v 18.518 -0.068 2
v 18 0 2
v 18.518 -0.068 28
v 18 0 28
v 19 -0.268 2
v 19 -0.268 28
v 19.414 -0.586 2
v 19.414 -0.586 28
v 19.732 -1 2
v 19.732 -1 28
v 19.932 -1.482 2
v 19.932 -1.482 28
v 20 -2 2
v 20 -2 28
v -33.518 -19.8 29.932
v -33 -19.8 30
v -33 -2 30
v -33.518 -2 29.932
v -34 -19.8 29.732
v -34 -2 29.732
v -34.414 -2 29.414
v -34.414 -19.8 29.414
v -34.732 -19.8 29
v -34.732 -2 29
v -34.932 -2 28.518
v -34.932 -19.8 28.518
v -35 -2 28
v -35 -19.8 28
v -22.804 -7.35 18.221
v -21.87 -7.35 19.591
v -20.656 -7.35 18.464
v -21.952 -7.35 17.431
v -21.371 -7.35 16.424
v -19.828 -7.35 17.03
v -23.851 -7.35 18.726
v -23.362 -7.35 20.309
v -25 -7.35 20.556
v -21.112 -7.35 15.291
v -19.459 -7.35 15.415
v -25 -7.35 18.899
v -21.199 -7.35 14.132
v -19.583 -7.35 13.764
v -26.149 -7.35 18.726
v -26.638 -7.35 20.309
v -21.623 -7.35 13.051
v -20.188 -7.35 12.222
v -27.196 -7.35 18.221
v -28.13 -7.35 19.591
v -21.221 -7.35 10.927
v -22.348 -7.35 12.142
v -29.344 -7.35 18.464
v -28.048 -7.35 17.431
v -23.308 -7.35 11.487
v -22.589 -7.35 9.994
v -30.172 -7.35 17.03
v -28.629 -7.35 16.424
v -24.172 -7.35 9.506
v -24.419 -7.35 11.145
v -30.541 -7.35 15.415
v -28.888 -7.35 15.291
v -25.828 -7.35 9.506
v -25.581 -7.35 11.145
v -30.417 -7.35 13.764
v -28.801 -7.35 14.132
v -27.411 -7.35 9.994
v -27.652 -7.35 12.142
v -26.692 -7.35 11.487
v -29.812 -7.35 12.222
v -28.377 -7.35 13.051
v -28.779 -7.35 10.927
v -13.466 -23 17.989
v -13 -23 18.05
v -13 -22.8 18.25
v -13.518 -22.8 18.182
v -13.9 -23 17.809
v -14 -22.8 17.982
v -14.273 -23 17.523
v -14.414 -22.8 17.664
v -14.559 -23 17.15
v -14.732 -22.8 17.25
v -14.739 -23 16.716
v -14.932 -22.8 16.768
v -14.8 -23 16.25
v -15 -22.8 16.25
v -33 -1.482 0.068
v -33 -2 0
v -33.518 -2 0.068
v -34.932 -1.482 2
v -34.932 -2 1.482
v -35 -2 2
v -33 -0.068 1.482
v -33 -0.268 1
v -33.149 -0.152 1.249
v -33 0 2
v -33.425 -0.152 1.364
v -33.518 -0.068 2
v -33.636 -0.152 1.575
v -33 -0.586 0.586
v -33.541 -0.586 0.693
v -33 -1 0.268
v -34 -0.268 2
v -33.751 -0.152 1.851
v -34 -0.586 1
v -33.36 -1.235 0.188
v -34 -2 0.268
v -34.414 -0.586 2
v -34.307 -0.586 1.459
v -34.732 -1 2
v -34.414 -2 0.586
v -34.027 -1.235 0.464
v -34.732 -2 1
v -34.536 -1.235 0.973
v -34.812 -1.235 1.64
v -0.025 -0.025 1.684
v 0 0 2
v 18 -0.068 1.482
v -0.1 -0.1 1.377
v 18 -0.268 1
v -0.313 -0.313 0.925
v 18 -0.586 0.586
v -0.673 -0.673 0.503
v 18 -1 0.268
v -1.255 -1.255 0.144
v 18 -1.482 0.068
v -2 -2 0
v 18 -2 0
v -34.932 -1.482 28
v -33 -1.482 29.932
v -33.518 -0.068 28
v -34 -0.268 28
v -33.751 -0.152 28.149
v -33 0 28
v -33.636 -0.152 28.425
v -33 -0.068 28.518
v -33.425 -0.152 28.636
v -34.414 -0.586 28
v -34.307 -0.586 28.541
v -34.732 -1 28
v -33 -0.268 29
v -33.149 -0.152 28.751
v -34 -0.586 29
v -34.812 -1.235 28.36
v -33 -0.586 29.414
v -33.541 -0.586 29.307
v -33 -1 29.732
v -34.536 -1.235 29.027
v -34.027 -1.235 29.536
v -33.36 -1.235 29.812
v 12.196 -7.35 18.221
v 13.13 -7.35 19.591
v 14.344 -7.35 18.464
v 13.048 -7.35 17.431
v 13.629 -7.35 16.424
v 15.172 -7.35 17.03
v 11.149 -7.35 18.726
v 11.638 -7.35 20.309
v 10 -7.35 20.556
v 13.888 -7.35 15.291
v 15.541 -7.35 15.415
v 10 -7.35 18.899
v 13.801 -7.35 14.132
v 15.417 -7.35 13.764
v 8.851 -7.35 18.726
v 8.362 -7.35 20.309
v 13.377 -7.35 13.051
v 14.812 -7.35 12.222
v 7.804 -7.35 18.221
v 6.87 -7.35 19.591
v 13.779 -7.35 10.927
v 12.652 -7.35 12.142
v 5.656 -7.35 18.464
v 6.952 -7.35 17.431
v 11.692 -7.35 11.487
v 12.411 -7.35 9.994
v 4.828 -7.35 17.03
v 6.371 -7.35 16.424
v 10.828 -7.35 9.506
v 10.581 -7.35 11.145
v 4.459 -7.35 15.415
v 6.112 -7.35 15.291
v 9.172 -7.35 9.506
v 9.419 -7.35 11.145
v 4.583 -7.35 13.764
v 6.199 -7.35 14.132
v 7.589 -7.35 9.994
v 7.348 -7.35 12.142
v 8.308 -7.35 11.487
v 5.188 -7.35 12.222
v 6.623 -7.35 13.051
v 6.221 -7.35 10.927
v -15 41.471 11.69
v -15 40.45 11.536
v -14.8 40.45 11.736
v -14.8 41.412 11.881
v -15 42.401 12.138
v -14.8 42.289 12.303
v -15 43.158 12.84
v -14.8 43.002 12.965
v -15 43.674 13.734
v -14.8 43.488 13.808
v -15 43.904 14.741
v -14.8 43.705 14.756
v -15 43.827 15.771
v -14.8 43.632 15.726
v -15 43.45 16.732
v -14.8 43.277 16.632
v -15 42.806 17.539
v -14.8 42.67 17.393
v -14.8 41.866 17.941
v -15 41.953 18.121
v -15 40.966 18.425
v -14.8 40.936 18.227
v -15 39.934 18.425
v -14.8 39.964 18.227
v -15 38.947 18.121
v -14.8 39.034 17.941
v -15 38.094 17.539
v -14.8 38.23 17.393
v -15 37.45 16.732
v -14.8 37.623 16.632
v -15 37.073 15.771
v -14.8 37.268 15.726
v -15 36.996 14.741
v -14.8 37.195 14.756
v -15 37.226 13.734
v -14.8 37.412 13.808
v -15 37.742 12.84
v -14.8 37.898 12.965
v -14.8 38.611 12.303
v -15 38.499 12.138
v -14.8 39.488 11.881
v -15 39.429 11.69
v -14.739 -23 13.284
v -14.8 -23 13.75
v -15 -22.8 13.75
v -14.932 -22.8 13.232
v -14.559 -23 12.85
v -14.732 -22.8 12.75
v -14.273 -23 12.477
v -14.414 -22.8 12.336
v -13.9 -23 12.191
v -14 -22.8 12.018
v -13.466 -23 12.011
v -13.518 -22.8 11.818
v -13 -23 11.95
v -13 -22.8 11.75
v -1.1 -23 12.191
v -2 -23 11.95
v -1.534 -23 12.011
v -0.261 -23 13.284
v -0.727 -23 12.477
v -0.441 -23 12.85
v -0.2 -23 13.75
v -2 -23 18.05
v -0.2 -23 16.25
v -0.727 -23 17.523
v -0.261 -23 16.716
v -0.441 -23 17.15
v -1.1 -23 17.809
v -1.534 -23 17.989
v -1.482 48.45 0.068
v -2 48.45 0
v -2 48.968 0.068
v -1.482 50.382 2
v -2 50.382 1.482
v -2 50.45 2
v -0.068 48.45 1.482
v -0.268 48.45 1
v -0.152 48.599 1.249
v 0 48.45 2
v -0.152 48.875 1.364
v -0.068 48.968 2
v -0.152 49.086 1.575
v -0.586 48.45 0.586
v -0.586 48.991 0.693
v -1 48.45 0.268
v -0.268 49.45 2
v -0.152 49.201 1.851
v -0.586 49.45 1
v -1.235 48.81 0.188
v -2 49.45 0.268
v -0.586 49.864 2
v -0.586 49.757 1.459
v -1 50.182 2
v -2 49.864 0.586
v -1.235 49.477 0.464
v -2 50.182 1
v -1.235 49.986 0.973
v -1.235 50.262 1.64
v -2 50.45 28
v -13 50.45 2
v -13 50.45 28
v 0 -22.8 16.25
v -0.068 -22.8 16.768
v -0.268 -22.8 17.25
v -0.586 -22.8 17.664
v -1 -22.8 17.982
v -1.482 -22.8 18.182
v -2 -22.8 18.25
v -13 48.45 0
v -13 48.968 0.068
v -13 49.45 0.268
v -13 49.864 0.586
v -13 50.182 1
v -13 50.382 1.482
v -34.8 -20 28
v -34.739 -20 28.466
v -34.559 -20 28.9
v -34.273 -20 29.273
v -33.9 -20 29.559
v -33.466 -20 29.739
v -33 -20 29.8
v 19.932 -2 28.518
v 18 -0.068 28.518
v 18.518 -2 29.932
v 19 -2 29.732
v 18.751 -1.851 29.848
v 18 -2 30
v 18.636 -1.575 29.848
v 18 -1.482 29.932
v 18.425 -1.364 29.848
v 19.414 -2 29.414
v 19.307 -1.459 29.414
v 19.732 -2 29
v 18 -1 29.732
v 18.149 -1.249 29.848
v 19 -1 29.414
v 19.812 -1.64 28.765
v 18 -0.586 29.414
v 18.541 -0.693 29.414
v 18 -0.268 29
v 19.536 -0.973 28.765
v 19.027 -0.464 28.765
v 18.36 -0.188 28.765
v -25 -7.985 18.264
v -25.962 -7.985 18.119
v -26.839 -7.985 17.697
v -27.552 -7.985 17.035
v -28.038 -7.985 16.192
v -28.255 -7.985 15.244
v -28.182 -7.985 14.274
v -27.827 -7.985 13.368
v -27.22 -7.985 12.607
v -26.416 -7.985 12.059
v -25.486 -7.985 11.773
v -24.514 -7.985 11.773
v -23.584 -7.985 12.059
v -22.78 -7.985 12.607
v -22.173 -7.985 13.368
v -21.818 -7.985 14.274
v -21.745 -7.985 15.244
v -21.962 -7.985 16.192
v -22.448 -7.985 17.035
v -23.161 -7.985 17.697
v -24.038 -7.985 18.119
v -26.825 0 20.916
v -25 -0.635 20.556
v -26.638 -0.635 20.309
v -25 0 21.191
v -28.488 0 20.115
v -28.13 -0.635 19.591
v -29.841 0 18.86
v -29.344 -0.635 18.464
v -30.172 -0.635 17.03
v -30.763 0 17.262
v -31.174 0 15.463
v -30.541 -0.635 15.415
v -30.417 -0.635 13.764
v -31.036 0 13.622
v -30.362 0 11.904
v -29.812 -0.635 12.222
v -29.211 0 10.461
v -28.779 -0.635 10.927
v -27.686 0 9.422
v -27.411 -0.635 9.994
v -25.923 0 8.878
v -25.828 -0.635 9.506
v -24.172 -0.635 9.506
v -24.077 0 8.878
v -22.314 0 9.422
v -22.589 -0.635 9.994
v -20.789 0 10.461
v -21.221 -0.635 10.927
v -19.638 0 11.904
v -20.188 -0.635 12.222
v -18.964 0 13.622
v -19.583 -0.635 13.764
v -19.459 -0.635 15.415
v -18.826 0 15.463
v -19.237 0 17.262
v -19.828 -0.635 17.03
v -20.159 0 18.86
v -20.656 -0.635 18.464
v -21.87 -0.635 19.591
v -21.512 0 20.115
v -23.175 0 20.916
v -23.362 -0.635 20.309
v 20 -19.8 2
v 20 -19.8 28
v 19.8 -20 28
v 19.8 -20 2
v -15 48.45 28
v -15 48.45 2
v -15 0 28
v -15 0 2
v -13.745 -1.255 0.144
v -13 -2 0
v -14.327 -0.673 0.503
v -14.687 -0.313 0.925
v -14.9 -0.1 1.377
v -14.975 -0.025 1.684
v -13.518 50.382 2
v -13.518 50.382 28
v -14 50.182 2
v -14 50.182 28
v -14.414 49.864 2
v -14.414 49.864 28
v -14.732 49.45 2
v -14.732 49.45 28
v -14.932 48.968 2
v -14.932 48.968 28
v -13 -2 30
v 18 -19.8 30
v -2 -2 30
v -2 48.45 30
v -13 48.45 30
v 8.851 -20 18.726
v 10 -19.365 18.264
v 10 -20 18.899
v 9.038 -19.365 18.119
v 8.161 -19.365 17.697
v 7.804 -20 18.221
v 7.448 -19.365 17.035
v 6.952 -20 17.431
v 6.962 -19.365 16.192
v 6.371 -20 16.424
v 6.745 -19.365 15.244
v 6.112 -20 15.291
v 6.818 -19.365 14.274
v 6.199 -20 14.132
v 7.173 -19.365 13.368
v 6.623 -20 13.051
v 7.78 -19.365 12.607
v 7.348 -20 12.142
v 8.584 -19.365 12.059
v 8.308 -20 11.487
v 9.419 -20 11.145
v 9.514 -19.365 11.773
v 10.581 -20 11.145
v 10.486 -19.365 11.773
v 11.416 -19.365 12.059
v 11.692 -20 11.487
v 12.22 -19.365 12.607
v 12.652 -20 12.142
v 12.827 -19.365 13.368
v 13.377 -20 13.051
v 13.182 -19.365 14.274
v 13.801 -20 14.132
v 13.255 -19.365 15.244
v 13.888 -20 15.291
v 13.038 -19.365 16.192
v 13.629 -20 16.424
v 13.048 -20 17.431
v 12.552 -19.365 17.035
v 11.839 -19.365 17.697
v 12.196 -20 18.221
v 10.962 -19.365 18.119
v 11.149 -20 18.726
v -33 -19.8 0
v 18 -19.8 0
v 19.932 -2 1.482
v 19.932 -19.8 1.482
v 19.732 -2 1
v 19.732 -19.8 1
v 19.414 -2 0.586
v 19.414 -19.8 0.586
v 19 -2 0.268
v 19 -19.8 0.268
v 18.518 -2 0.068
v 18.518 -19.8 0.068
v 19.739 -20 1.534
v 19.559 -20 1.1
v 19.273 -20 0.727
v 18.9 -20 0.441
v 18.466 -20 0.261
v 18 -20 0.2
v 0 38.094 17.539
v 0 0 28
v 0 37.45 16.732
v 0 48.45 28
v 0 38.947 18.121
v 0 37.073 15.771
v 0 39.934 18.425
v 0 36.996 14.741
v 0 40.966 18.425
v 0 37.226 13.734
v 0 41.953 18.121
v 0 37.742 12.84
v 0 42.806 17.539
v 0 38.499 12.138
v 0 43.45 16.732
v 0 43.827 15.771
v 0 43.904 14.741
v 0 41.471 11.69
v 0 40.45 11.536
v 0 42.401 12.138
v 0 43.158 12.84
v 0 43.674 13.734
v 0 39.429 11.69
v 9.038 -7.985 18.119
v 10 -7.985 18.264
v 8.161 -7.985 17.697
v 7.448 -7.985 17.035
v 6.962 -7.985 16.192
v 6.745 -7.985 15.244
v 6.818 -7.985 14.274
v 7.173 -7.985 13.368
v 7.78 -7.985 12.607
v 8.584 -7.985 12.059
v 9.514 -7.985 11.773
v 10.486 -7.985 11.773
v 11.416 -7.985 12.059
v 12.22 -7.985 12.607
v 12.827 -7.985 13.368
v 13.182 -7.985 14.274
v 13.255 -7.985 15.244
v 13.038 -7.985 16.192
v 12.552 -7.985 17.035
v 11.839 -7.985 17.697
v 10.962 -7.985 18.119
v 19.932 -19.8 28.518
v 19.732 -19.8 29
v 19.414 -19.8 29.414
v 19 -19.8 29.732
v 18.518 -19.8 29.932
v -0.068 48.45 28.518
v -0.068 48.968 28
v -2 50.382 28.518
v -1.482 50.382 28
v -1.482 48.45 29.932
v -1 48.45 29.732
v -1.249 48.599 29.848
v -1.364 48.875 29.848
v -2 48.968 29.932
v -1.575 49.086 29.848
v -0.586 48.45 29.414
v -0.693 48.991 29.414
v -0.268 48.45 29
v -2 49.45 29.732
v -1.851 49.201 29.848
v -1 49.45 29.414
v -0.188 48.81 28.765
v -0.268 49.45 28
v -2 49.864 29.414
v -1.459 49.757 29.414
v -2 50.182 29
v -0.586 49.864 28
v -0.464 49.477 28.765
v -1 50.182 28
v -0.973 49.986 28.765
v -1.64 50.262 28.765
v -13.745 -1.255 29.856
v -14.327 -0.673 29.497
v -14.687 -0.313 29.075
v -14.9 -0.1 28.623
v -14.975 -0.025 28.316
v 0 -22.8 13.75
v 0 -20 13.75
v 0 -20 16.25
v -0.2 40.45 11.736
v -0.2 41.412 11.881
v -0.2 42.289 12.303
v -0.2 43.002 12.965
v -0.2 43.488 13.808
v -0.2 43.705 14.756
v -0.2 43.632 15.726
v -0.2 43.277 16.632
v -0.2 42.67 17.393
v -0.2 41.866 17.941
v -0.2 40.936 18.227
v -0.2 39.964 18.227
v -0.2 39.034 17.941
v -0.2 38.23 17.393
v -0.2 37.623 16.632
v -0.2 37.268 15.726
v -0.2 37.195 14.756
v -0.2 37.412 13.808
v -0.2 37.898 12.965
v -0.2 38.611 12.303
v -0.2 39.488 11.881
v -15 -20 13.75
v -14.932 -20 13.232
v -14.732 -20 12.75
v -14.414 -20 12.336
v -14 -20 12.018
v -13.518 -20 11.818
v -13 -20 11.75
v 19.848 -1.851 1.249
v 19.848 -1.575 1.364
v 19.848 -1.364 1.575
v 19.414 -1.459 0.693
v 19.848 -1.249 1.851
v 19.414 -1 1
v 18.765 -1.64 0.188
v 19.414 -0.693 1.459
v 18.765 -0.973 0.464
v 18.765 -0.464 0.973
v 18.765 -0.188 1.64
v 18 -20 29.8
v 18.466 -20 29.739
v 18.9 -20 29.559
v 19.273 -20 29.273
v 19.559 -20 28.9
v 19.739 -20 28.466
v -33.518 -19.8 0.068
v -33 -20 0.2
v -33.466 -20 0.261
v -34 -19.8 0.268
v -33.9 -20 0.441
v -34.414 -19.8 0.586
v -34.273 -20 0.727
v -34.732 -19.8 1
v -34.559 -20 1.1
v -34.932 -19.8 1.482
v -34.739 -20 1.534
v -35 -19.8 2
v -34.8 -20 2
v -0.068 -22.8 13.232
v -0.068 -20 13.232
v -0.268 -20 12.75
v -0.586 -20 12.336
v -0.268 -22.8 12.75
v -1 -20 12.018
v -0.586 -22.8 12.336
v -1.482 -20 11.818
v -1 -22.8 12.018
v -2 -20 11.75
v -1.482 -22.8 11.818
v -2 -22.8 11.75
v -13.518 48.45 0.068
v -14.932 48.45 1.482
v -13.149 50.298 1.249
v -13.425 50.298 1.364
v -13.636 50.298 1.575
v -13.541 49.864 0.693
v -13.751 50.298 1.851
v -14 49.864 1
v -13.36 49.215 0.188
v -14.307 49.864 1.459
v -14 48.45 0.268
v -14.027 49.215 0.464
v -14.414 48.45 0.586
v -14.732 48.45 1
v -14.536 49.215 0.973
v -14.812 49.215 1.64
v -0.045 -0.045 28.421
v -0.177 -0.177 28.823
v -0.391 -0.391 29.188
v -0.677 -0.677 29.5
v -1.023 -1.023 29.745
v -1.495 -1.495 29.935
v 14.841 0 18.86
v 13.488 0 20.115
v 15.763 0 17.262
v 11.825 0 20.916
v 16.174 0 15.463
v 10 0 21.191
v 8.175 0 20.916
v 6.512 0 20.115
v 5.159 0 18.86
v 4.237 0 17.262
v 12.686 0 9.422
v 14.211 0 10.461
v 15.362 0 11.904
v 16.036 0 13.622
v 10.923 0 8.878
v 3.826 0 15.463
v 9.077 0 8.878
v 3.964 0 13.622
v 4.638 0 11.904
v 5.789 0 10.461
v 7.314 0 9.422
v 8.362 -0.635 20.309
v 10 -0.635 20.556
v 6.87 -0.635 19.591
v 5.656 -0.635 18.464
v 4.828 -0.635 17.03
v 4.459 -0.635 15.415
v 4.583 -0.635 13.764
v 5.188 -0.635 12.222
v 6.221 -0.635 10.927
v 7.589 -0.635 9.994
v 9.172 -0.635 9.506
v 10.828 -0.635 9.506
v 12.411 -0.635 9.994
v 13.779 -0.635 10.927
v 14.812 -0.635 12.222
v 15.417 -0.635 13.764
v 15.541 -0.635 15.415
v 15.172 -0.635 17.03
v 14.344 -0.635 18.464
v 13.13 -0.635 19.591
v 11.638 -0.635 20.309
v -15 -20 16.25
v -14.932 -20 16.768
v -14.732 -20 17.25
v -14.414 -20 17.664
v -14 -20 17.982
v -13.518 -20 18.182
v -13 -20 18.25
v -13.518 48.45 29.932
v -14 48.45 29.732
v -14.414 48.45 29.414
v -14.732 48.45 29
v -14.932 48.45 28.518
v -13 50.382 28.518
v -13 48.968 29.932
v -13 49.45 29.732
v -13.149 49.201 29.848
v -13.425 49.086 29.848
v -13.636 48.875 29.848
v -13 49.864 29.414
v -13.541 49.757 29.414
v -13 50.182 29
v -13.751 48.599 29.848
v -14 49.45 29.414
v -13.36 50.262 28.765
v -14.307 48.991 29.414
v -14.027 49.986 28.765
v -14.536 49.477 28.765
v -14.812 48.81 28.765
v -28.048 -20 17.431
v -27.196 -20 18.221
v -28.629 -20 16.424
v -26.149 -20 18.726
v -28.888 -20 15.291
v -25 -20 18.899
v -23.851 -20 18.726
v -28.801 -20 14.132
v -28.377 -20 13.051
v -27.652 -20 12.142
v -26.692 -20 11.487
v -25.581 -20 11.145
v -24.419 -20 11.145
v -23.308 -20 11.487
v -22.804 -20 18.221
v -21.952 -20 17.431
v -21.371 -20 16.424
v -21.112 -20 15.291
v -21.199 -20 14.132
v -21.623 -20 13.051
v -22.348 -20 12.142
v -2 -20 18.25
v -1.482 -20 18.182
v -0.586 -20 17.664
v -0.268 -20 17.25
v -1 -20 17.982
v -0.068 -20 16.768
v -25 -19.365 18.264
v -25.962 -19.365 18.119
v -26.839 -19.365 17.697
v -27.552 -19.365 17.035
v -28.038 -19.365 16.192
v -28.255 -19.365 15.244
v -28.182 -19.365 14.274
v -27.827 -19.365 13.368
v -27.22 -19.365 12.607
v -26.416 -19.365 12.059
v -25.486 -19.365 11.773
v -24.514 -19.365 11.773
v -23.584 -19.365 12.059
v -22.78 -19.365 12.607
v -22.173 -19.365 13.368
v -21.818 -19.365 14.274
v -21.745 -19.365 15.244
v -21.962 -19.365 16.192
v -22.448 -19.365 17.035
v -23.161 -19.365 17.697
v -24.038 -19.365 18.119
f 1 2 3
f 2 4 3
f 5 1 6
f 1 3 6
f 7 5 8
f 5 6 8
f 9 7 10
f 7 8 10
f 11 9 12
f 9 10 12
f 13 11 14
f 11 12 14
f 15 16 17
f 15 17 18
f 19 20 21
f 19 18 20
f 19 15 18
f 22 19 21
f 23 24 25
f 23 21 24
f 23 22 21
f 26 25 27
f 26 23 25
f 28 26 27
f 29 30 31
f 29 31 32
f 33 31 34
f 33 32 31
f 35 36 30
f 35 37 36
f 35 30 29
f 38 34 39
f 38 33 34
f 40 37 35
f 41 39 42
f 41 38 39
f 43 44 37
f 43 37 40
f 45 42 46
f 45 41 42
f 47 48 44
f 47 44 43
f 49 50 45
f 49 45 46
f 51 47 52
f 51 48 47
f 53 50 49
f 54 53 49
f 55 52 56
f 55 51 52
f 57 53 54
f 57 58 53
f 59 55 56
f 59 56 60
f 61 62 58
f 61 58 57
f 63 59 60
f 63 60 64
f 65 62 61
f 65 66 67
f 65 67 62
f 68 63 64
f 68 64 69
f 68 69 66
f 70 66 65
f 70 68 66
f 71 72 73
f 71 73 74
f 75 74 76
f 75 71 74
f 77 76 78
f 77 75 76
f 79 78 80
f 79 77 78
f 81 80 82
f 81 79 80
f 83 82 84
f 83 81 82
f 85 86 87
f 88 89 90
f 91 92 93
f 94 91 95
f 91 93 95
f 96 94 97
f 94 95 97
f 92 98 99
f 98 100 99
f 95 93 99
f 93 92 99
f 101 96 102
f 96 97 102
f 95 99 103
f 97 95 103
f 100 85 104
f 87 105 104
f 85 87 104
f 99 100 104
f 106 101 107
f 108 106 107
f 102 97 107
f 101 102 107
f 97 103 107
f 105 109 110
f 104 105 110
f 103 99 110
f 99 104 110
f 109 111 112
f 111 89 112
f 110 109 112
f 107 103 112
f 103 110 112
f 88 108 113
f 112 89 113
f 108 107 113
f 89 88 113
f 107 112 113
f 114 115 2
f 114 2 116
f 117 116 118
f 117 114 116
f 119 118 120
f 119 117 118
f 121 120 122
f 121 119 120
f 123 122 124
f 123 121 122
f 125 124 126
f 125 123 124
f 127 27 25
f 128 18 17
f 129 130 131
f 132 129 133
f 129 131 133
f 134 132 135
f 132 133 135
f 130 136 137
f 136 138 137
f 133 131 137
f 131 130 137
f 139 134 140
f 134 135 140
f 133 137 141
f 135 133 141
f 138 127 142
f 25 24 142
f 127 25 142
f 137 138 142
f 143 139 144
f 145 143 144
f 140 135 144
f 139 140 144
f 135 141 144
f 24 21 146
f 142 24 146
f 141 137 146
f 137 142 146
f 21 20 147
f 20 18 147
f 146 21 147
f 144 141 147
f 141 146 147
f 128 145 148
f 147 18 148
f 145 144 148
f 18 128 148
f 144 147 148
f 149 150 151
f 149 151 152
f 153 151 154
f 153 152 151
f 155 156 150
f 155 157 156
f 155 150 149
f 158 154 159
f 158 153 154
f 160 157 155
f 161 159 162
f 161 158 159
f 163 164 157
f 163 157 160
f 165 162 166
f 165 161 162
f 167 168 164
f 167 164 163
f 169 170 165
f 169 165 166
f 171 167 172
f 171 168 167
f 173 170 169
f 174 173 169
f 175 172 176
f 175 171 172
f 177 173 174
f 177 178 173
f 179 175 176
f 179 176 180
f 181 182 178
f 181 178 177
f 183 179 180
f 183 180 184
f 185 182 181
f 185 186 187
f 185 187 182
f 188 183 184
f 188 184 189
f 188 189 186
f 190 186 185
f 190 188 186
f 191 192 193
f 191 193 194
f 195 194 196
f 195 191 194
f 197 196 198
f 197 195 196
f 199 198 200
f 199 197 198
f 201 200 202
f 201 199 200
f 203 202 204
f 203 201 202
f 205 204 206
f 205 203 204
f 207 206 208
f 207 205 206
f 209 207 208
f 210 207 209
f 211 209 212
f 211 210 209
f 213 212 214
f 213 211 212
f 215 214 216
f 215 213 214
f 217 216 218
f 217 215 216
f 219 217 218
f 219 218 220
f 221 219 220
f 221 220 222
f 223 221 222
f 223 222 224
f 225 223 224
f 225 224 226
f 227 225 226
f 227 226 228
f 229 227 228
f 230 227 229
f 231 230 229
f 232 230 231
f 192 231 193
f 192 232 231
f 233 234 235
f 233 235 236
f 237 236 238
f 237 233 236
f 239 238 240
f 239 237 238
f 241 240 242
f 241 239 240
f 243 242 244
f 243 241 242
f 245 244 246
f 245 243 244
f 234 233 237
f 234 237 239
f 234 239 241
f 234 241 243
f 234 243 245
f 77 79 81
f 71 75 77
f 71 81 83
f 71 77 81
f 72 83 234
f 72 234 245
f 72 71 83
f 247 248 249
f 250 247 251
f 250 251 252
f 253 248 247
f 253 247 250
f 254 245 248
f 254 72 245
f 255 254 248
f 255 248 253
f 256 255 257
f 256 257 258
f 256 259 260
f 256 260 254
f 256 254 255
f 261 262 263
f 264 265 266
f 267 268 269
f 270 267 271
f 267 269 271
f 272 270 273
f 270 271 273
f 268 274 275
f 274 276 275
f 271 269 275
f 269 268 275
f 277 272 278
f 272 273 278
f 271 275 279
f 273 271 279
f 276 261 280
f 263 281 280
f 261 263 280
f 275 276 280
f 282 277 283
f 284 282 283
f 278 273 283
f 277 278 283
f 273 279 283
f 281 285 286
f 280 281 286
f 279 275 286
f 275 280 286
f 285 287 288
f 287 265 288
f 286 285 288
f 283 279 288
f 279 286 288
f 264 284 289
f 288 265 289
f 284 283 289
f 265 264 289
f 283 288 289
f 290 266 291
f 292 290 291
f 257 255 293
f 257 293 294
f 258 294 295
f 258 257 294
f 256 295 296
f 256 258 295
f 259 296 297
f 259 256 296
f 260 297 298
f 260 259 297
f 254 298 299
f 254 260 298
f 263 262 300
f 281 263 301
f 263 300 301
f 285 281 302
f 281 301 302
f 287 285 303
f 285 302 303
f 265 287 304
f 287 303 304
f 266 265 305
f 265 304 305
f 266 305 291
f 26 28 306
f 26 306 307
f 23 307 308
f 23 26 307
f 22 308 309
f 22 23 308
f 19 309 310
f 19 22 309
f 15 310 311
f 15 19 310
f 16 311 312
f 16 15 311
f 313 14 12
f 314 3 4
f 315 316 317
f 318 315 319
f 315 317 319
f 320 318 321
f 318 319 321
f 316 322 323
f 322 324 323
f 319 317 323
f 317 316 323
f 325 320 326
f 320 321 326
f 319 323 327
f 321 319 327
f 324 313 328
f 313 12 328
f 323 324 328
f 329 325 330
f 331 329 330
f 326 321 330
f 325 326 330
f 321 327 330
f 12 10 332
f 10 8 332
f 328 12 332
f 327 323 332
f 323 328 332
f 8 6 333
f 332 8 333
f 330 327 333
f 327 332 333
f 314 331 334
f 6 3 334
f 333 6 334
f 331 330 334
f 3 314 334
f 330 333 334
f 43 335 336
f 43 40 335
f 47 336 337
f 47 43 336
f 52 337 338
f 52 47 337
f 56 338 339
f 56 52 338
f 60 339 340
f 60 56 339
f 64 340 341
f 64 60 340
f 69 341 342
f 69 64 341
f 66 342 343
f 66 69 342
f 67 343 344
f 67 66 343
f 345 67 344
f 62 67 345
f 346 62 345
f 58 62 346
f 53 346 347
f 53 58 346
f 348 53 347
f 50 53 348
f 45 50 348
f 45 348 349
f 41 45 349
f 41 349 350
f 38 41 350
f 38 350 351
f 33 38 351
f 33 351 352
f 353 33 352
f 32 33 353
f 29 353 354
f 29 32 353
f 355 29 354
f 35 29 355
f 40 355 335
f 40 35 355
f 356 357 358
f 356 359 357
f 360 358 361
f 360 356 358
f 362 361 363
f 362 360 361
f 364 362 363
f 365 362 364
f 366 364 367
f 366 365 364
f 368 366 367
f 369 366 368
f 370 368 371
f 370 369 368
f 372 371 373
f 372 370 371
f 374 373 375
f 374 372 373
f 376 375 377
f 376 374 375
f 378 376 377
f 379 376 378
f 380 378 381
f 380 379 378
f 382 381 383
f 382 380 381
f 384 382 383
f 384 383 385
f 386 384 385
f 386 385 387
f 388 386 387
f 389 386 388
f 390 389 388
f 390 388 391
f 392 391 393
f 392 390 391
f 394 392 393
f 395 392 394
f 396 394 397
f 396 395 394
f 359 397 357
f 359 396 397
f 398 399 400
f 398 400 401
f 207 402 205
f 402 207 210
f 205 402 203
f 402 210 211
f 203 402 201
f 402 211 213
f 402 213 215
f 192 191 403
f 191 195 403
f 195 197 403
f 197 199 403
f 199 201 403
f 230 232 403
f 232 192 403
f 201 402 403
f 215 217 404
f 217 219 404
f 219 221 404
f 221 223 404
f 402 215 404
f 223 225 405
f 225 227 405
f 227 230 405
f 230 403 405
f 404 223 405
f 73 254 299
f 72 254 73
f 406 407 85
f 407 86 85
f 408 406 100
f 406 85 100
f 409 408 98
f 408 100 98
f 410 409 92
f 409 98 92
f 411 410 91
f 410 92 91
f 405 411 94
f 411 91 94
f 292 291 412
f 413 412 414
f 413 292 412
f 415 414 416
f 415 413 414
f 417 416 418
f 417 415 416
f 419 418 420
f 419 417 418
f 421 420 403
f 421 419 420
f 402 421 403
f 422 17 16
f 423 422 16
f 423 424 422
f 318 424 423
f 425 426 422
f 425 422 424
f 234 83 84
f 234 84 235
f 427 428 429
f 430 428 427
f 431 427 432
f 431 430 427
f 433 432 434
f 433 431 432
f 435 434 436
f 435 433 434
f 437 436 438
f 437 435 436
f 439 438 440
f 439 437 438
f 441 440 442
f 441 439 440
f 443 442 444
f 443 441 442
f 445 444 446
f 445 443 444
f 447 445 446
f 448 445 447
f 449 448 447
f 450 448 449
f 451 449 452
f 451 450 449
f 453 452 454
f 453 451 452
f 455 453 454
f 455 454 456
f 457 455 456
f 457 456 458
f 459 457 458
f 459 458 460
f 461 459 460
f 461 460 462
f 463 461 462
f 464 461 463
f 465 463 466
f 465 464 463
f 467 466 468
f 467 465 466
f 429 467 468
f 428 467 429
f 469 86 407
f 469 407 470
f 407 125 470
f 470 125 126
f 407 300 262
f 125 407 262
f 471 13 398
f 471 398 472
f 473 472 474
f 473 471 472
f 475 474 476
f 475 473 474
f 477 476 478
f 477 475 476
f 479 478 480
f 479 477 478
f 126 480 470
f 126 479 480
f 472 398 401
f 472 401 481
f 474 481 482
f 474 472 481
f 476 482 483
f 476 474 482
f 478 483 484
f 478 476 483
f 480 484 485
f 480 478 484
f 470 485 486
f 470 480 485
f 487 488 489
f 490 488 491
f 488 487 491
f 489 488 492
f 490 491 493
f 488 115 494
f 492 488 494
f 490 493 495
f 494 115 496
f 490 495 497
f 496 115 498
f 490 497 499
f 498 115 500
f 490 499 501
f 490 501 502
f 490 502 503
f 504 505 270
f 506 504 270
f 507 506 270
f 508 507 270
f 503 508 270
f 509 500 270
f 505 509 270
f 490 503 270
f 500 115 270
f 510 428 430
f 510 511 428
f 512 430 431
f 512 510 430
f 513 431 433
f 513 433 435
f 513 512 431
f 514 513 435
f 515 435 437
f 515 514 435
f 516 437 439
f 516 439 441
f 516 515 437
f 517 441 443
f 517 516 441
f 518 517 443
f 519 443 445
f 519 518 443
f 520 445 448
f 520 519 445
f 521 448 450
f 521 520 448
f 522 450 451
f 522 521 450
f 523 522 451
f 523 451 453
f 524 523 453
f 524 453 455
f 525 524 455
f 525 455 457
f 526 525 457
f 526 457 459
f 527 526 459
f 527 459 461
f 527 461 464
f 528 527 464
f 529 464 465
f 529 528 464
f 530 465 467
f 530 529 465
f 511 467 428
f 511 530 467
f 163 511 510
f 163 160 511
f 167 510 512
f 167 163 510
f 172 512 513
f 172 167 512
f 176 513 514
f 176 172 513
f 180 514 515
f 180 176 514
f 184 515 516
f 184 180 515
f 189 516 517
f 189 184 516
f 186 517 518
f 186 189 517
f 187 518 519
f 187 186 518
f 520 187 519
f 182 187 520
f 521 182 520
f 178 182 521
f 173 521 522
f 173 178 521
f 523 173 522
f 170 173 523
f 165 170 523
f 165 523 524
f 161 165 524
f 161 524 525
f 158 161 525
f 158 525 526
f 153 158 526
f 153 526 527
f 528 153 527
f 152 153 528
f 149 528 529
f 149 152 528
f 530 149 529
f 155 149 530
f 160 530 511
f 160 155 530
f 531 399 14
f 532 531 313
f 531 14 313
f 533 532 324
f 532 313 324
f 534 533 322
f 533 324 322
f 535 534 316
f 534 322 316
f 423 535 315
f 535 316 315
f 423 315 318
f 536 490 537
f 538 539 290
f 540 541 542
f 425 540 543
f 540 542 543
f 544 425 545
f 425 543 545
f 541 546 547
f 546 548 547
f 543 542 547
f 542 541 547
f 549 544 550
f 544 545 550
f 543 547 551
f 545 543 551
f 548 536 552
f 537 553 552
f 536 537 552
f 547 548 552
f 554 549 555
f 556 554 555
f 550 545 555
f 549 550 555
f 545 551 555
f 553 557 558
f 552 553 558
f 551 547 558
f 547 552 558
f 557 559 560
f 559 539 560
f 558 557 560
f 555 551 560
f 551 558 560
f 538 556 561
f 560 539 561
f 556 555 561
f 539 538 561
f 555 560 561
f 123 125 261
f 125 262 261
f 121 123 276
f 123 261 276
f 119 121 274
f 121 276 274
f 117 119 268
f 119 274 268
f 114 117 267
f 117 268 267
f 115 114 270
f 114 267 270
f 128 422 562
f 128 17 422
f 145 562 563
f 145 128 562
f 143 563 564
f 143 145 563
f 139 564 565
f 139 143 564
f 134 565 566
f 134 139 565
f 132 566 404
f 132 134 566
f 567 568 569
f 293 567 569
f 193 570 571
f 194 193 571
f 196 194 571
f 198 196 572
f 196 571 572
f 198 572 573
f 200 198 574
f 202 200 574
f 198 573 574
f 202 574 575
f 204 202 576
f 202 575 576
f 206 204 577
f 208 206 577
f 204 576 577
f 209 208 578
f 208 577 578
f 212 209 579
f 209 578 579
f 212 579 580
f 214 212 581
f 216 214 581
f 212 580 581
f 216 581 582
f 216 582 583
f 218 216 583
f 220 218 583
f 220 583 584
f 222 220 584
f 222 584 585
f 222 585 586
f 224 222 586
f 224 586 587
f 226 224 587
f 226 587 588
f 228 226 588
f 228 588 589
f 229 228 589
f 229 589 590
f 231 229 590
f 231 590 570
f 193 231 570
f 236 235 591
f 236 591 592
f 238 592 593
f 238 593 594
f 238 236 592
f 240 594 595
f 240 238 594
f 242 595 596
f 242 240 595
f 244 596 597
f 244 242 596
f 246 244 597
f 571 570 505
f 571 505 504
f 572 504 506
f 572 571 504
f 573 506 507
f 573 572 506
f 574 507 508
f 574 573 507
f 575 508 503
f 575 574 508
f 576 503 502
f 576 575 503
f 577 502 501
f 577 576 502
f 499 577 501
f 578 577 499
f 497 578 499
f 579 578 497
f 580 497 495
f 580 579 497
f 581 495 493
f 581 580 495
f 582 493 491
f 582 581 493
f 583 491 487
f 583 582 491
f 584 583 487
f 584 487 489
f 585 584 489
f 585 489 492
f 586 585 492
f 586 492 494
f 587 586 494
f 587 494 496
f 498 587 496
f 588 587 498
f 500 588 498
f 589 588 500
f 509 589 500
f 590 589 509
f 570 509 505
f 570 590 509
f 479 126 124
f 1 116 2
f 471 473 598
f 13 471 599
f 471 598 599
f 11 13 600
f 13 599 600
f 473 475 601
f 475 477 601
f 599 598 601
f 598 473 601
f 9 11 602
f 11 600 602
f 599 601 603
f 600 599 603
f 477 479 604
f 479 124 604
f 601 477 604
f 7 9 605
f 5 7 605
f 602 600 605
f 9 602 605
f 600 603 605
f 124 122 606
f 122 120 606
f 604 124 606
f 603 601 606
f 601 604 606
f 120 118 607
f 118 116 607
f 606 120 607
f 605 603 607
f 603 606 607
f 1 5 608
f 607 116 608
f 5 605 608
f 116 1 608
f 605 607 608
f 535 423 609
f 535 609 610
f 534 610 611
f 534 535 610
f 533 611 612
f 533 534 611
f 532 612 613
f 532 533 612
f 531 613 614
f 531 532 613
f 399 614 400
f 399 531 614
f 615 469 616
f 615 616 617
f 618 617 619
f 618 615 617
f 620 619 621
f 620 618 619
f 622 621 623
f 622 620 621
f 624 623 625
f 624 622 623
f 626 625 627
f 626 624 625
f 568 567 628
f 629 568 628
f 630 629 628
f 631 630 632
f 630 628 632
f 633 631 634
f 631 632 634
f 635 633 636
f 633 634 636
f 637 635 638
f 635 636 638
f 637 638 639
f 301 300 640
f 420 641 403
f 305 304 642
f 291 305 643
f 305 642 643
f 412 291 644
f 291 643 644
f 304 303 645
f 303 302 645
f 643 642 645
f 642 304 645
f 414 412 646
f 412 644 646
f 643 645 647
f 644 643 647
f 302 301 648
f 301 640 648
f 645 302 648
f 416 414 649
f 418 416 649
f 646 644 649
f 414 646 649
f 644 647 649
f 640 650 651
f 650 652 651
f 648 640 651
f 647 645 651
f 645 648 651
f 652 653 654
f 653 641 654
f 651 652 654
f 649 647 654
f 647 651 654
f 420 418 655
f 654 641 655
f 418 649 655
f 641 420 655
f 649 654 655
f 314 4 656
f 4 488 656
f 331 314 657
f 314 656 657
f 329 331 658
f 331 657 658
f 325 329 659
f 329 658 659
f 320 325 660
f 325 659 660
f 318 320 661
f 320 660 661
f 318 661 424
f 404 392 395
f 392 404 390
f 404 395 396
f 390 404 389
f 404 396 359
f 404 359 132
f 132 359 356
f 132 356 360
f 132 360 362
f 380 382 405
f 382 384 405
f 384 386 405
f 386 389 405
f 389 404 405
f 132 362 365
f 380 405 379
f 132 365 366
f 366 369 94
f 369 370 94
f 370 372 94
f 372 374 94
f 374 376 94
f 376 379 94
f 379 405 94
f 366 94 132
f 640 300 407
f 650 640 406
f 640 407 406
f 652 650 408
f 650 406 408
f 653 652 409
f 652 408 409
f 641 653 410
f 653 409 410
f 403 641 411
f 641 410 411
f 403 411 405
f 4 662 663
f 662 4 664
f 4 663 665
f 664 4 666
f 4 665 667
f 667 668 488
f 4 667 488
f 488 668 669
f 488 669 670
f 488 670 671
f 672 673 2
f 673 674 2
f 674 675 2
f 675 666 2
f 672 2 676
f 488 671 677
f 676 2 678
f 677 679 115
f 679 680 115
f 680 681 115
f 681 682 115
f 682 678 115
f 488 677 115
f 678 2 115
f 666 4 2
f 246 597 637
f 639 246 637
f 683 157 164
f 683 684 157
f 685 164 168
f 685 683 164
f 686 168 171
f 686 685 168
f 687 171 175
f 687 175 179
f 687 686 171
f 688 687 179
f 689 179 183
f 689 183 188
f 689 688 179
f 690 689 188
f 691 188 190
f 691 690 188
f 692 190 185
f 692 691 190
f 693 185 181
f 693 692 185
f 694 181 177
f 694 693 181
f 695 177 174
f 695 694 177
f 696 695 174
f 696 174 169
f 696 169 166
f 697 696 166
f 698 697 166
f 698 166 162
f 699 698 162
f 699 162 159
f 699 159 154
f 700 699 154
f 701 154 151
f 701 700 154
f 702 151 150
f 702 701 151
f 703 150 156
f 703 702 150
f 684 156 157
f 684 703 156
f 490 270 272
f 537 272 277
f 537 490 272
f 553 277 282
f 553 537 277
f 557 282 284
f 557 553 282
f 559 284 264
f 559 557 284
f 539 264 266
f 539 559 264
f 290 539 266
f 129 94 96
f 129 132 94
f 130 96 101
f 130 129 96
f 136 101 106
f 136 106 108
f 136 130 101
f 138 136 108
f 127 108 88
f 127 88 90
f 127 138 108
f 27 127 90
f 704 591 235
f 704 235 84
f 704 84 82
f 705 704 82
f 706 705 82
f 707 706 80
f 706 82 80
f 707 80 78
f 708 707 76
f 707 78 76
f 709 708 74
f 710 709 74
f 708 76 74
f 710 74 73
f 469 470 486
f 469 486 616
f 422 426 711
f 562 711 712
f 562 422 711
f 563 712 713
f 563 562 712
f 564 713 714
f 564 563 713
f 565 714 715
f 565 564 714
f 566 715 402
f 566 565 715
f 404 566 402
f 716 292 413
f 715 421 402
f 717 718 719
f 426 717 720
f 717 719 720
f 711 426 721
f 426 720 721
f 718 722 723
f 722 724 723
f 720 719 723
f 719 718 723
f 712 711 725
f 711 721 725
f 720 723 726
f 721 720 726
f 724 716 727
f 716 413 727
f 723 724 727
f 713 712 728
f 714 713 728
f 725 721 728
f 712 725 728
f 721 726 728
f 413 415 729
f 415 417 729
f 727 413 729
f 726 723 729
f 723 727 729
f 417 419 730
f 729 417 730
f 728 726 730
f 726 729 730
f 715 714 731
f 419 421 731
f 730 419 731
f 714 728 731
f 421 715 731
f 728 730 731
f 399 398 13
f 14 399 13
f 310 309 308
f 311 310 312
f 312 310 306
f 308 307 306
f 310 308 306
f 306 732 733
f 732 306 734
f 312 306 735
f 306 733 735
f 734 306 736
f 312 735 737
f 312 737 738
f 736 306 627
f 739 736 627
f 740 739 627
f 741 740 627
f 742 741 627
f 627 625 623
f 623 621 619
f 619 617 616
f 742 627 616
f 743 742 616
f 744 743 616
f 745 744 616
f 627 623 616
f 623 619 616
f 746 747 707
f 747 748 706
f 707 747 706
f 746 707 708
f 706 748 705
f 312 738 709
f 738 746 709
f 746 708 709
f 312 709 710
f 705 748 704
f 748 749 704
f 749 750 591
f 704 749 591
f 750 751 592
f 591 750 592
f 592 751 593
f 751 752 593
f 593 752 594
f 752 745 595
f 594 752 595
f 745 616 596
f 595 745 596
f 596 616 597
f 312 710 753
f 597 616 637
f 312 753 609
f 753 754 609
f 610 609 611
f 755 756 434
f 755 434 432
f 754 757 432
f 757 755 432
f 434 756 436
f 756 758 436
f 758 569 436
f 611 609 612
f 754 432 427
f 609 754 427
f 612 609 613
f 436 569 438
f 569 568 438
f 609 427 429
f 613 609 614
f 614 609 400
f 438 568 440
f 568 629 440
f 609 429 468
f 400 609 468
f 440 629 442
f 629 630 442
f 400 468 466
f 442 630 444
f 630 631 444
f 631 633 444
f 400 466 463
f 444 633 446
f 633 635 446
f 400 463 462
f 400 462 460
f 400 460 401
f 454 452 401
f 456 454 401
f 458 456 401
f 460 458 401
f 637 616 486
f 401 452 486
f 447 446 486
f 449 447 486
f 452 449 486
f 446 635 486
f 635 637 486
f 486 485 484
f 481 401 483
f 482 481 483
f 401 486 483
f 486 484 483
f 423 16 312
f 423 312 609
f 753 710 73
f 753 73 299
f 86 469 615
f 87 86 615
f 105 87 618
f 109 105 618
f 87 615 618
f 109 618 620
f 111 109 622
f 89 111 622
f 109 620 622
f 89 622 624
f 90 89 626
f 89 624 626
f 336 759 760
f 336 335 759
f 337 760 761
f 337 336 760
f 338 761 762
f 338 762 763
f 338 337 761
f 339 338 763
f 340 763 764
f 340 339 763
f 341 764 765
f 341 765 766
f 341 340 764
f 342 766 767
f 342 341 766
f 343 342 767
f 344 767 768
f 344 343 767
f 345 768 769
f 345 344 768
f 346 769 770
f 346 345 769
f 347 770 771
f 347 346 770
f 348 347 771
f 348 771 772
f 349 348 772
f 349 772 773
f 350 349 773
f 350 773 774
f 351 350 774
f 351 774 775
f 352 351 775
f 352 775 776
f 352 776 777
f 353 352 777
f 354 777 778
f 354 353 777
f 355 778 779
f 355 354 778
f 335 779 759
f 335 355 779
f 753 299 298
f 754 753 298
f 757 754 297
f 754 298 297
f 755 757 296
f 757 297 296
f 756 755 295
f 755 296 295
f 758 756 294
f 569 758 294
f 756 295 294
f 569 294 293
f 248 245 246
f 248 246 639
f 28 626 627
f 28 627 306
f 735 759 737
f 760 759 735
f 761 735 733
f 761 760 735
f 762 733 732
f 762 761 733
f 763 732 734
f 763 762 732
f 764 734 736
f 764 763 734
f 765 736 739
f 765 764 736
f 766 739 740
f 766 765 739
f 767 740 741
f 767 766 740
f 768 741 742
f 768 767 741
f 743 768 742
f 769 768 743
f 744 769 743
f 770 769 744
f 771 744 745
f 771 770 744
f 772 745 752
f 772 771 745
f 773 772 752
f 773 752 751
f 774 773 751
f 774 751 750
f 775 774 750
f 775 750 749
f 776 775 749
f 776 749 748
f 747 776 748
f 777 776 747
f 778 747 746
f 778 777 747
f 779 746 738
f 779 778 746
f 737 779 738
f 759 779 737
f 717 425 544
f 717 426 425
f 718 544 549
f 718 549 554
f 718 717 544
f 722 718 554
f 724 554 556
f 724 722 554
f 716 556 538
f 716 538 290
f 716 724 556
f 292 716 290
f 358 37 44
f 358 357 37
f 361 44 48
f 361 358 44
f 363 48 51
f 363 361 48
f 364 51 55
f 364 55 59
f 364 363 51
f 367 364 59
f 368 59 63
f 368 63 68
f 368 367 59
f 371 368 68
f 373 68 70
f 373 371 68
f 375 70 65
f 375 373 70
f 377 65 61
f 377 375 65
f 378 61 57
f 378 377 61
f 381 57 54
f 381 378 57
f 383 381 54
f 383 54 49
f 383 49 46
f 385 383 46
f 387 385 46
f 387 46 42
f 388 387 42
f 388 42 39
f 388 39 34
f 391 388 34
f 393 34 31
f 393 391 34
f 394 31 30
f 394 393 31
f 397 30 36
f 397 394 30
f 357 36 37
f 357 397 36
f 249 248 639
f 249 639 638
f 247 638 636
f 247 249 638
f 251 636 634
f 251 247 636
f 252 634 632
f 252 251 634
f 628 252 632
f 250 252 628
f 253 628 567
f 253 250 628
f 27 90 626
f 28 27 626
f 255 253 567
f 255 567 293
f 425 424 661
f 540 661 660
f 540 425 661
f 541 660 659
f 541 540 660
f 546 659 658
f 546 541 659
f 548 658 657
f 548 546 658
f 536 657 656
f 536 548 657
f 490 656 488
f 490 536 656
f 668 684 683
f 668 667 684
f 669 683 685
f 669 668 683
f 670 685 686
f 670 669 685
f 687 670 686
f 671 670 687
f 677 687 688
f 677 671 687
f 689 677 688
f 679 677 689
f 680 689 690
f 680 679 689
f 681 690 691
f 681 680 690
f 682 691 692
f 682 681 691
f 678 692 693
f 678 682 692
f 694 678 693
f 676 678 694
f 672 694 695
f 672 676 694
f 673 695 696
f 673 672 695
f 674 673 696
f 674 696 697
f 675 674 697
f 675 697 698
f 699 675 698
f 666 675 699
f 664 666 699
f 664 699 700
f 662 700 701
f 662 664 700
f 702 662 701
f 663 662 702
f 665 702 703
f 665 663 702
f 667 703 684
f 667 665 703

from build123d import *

# Parameters (mm, degrees)
BOSS_EXTRUDE1_DEPTH                           = 30
SKETCH2_R                                     = 3.2639
CUT_EXTRUDE1_DEPTH                            = 36
CBORE_FOR_1_4_SOCKET_HEAD_CAP_SCREW1_AT_COUNT = 2
CBORE_FOR_1_4_SOCKET_HEAD_CAP_SCREW1_AT_PITCH = 35
SKETCH7_W                                     = 15
SKETCH7_H                                     = 6.5
BOSS_EXTRUDE2_DEPTH                           = 3
FILLET1_R                                     = 2
CHAMFER1_SIZE                                 = 0.2


with BuildPart() as part:
    # Sketch1 → Boss-Extrude1 (new body)
    with BuildSketch(Plane.XY):
        Polygon((20, 0), (0, 0), (0, 50.45), (-15, 50.45), (-15, 0), (-35, 0), (-35, -20), (20, -20), align=None)
    extrude(amount=BOSS_EXTRUDE1_DEPTH)

    # Sketch2 → Cut-Extrude1 (cut, through all)
    with BuildSketch(Plane(origin=(0, 0, 0), x_dir=(0, 0, -1), z_dir=(1, 0, 0))):
        with Locations((-15, 40.45)):
            Circle(SKETCH2_R)
    extrude(amount=-CUT_EXTRUDE1_DEPTH, mode=Mode.SUBTRACT)

    # Sketch5 → CBORE for 1/4 Socket Head Cap Screw1 (revolve, cut)
    with BuildSketch(Plane(origin=(-25, 0, 15), x_dir=(0, 0, 1), z_dir=(1, 0, 0))):
        Polygon((0, 0), (0, 20), (3.8989, 20), (3.2639, 19.365), (3.2639, 7.984998), (3.8989, 7.349998), (5.55625, 7.349998), (5.55625, 0.635), (6.19125, 0), align=None)
    cbore_for_1_4_socket_head_cap_screw1 = revolve(axis=Axis((-25, 6.35, 15), (0, -1, 0)), mode=Mode.SUBTRACT)

    # CBORE for 1/4 Socket Head Cap Screw1 at: CBORE for 1/4 Socket Head Cap Screw1 ×2
    with Locations(*[(i * CBORE_FOR_1_4_SOCKET_HEAD_CAP_SCREW1_AT_PITCH, 0, 0) for i in range(1, CBORE_FOR_1_4_SOCKET_HEAD_CAP_SCREW1_AT_COUNT)]):
        add(cbore_for_1_4_socket_head_cap_screw1, mode=Mode.SUBTRACT)

    # Sketch7 → Boss-Extrude2 (add)
    with BuildSketch(Plane.XZ.offset(20)):
        with Locations((-7.5, 15)):
            Rectangle(SKETCH7_W, SKETCH7_H)
    extrude(amount=BOSS_EXTRUDE2_DEPTH)

    # Fillet1
    fillet1_edges = [part.edges().sort_by_distance(p)[0] for p in [
        (-35, -10, 30),
        (-15, 25.225, 0),
        (-7.5, 50.45, 0),
        (0, 25.225, 0),
        (10, 0, 0),
        (20, -10, 0),
        (-35, -10, 0),
        (-25, 0, 0),
        (-15, 50.45, 15),
        (0, 50.45, 15),
        (20, 0, 15),
        (-35, 0, 15),
        (20, -10, 30),
        (10, 0, 30),
        (0, 25.225, 30),
        (-7.5, 50.45, 30),
        (-15, 25.225, 30),
        (-25, 0, 30),
        (-15, -21.5, 11.75),
        (0, -21.5, 11.75),
        (0, -21.5, 18.25),
        (-15, -21.5, 18.25),
    ]]
    fillet(fillet1_edges, radius=FILLET1_R)

    # Chamfer1
    chamfer1_edges = [part.edges().sort_by_distance(p)[0] for p in [
        (-35, -20, 15),
        (-34.414213562, -20, 29.414213562),
        (-34.414213562, -20, 0.585786438),
        (19.414213562, -20, 0.585786438),
        (19.414213562, -20, 29.414213562),
        (-15, 40.45, 18.2639),
        (0, 40.45, 18.2639),
        (0, -23, 15),
        (-7.5, -23, 11.75),
        (-7.5, -23, 18.25),
        (-15, -23, 15),
        (-14.414213562, -23, 12.335786438),
        (-14.414213562, -23, 17.664213562),
        (-0.585786438, -23, 17.664213562),
        (-0.585786438, -23, 12.335786438),
        (-7.5, -20, 0),
        (-7.5, -20, 30),
        (20, -20, 15),
    ]]
    chamfer(chamfer1_edges, length=CHAMFER1_SIZE)


solid = part.part
